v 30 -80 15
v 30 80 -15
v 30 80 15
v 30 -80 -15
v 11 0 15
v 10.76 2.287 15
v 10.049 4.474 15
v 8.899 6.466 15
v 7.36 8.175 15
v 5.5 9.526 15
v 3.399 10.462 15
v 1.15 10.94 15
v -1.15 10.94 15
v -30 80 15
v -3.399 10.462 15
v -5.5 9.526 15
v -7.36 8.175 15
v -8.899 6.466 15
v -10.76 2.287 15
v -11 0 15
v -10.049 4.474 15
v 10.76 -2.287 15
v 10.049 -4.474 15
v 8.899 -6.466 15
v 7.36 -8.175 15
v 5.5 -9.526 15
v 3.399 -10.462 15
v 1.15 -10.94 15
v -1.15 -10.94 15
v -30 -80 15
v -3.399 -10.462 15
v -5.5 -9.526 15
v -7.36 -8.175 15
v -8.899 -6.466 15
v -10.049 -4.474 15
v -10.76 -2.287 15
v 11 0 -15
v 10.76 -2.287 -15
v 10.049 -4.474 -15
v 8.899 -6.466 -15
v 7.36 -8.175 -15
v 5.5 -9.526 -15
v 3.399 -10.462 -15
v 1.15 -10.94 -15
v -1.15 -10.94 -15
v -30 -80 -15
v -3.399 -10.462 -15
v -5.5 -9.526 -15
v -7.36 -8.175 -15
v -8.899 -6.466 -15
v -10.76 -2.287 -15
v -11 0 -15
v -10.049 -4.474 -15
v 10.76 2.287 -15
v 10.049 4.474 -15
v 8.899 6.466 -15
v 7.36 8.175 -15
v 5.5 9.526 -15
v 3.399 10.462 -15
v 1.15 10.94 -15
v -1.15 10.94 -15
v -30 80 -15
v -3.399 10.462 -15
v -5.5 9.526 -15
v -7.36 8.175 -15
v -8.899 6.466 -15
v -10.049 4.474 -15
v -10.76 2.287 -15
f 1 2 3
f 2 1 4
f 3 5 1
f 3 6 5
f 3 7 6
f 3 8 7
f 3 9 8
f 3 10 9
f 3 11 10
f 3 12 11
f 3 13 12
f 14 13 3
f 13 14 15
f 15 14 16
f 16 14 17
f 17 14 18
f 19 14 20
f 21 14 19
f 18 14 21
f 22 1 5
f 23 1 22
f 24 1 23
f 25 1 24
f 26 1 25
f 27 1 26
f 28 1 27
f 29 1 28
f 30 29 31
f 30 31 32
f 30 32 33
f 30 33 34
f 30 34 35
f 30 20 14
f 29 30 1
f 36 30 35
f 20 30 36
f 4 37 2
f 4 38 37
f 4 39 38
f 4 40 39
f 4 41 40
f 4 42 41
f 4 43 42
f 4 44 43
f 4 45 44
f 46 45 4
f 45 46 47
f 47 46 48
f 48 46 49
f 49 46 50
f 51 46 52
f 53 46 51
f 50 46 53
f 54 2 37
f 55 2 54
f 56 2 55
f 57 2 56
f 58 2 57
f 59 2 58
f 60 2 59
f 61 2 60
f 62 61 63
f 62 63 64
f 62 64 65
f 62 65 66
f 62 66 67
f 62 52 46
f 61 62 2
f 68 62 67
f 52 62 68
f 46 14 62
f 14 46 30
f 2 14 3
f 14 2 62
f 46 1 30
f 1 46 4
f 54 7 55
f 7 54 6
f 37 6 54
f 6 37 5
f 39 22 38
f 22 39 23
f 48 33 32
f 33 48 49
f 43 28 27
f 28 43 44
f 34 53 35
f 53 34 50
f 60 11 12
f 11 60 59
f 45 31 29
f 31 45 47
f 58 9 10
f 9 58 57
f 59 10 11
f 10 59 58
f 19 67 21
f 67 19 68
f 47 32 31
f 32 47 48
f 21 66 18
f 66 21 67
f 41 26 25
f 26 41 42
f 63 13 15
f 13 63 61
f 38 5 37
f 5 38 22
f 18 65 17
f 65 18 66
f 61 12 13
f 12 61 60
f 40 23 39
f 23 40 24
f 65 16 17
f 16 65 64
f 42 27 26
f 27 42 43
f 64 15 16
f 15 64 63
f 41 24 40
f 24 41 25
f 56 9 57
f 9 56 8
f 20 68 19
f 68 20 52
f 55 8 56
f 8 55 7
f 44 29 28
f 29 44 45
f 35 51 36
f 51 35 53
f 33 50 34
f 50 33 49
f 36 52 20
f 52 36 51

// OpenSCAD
difference(){
cube([60,160,30], center=true);

//608z for trapezoidal screw   
cylinder(h=100,r=11, center=true);    
    
cylinder(h=100,r=11, center=true);    
cylinder(h=100,r=11, center=true);        
}
